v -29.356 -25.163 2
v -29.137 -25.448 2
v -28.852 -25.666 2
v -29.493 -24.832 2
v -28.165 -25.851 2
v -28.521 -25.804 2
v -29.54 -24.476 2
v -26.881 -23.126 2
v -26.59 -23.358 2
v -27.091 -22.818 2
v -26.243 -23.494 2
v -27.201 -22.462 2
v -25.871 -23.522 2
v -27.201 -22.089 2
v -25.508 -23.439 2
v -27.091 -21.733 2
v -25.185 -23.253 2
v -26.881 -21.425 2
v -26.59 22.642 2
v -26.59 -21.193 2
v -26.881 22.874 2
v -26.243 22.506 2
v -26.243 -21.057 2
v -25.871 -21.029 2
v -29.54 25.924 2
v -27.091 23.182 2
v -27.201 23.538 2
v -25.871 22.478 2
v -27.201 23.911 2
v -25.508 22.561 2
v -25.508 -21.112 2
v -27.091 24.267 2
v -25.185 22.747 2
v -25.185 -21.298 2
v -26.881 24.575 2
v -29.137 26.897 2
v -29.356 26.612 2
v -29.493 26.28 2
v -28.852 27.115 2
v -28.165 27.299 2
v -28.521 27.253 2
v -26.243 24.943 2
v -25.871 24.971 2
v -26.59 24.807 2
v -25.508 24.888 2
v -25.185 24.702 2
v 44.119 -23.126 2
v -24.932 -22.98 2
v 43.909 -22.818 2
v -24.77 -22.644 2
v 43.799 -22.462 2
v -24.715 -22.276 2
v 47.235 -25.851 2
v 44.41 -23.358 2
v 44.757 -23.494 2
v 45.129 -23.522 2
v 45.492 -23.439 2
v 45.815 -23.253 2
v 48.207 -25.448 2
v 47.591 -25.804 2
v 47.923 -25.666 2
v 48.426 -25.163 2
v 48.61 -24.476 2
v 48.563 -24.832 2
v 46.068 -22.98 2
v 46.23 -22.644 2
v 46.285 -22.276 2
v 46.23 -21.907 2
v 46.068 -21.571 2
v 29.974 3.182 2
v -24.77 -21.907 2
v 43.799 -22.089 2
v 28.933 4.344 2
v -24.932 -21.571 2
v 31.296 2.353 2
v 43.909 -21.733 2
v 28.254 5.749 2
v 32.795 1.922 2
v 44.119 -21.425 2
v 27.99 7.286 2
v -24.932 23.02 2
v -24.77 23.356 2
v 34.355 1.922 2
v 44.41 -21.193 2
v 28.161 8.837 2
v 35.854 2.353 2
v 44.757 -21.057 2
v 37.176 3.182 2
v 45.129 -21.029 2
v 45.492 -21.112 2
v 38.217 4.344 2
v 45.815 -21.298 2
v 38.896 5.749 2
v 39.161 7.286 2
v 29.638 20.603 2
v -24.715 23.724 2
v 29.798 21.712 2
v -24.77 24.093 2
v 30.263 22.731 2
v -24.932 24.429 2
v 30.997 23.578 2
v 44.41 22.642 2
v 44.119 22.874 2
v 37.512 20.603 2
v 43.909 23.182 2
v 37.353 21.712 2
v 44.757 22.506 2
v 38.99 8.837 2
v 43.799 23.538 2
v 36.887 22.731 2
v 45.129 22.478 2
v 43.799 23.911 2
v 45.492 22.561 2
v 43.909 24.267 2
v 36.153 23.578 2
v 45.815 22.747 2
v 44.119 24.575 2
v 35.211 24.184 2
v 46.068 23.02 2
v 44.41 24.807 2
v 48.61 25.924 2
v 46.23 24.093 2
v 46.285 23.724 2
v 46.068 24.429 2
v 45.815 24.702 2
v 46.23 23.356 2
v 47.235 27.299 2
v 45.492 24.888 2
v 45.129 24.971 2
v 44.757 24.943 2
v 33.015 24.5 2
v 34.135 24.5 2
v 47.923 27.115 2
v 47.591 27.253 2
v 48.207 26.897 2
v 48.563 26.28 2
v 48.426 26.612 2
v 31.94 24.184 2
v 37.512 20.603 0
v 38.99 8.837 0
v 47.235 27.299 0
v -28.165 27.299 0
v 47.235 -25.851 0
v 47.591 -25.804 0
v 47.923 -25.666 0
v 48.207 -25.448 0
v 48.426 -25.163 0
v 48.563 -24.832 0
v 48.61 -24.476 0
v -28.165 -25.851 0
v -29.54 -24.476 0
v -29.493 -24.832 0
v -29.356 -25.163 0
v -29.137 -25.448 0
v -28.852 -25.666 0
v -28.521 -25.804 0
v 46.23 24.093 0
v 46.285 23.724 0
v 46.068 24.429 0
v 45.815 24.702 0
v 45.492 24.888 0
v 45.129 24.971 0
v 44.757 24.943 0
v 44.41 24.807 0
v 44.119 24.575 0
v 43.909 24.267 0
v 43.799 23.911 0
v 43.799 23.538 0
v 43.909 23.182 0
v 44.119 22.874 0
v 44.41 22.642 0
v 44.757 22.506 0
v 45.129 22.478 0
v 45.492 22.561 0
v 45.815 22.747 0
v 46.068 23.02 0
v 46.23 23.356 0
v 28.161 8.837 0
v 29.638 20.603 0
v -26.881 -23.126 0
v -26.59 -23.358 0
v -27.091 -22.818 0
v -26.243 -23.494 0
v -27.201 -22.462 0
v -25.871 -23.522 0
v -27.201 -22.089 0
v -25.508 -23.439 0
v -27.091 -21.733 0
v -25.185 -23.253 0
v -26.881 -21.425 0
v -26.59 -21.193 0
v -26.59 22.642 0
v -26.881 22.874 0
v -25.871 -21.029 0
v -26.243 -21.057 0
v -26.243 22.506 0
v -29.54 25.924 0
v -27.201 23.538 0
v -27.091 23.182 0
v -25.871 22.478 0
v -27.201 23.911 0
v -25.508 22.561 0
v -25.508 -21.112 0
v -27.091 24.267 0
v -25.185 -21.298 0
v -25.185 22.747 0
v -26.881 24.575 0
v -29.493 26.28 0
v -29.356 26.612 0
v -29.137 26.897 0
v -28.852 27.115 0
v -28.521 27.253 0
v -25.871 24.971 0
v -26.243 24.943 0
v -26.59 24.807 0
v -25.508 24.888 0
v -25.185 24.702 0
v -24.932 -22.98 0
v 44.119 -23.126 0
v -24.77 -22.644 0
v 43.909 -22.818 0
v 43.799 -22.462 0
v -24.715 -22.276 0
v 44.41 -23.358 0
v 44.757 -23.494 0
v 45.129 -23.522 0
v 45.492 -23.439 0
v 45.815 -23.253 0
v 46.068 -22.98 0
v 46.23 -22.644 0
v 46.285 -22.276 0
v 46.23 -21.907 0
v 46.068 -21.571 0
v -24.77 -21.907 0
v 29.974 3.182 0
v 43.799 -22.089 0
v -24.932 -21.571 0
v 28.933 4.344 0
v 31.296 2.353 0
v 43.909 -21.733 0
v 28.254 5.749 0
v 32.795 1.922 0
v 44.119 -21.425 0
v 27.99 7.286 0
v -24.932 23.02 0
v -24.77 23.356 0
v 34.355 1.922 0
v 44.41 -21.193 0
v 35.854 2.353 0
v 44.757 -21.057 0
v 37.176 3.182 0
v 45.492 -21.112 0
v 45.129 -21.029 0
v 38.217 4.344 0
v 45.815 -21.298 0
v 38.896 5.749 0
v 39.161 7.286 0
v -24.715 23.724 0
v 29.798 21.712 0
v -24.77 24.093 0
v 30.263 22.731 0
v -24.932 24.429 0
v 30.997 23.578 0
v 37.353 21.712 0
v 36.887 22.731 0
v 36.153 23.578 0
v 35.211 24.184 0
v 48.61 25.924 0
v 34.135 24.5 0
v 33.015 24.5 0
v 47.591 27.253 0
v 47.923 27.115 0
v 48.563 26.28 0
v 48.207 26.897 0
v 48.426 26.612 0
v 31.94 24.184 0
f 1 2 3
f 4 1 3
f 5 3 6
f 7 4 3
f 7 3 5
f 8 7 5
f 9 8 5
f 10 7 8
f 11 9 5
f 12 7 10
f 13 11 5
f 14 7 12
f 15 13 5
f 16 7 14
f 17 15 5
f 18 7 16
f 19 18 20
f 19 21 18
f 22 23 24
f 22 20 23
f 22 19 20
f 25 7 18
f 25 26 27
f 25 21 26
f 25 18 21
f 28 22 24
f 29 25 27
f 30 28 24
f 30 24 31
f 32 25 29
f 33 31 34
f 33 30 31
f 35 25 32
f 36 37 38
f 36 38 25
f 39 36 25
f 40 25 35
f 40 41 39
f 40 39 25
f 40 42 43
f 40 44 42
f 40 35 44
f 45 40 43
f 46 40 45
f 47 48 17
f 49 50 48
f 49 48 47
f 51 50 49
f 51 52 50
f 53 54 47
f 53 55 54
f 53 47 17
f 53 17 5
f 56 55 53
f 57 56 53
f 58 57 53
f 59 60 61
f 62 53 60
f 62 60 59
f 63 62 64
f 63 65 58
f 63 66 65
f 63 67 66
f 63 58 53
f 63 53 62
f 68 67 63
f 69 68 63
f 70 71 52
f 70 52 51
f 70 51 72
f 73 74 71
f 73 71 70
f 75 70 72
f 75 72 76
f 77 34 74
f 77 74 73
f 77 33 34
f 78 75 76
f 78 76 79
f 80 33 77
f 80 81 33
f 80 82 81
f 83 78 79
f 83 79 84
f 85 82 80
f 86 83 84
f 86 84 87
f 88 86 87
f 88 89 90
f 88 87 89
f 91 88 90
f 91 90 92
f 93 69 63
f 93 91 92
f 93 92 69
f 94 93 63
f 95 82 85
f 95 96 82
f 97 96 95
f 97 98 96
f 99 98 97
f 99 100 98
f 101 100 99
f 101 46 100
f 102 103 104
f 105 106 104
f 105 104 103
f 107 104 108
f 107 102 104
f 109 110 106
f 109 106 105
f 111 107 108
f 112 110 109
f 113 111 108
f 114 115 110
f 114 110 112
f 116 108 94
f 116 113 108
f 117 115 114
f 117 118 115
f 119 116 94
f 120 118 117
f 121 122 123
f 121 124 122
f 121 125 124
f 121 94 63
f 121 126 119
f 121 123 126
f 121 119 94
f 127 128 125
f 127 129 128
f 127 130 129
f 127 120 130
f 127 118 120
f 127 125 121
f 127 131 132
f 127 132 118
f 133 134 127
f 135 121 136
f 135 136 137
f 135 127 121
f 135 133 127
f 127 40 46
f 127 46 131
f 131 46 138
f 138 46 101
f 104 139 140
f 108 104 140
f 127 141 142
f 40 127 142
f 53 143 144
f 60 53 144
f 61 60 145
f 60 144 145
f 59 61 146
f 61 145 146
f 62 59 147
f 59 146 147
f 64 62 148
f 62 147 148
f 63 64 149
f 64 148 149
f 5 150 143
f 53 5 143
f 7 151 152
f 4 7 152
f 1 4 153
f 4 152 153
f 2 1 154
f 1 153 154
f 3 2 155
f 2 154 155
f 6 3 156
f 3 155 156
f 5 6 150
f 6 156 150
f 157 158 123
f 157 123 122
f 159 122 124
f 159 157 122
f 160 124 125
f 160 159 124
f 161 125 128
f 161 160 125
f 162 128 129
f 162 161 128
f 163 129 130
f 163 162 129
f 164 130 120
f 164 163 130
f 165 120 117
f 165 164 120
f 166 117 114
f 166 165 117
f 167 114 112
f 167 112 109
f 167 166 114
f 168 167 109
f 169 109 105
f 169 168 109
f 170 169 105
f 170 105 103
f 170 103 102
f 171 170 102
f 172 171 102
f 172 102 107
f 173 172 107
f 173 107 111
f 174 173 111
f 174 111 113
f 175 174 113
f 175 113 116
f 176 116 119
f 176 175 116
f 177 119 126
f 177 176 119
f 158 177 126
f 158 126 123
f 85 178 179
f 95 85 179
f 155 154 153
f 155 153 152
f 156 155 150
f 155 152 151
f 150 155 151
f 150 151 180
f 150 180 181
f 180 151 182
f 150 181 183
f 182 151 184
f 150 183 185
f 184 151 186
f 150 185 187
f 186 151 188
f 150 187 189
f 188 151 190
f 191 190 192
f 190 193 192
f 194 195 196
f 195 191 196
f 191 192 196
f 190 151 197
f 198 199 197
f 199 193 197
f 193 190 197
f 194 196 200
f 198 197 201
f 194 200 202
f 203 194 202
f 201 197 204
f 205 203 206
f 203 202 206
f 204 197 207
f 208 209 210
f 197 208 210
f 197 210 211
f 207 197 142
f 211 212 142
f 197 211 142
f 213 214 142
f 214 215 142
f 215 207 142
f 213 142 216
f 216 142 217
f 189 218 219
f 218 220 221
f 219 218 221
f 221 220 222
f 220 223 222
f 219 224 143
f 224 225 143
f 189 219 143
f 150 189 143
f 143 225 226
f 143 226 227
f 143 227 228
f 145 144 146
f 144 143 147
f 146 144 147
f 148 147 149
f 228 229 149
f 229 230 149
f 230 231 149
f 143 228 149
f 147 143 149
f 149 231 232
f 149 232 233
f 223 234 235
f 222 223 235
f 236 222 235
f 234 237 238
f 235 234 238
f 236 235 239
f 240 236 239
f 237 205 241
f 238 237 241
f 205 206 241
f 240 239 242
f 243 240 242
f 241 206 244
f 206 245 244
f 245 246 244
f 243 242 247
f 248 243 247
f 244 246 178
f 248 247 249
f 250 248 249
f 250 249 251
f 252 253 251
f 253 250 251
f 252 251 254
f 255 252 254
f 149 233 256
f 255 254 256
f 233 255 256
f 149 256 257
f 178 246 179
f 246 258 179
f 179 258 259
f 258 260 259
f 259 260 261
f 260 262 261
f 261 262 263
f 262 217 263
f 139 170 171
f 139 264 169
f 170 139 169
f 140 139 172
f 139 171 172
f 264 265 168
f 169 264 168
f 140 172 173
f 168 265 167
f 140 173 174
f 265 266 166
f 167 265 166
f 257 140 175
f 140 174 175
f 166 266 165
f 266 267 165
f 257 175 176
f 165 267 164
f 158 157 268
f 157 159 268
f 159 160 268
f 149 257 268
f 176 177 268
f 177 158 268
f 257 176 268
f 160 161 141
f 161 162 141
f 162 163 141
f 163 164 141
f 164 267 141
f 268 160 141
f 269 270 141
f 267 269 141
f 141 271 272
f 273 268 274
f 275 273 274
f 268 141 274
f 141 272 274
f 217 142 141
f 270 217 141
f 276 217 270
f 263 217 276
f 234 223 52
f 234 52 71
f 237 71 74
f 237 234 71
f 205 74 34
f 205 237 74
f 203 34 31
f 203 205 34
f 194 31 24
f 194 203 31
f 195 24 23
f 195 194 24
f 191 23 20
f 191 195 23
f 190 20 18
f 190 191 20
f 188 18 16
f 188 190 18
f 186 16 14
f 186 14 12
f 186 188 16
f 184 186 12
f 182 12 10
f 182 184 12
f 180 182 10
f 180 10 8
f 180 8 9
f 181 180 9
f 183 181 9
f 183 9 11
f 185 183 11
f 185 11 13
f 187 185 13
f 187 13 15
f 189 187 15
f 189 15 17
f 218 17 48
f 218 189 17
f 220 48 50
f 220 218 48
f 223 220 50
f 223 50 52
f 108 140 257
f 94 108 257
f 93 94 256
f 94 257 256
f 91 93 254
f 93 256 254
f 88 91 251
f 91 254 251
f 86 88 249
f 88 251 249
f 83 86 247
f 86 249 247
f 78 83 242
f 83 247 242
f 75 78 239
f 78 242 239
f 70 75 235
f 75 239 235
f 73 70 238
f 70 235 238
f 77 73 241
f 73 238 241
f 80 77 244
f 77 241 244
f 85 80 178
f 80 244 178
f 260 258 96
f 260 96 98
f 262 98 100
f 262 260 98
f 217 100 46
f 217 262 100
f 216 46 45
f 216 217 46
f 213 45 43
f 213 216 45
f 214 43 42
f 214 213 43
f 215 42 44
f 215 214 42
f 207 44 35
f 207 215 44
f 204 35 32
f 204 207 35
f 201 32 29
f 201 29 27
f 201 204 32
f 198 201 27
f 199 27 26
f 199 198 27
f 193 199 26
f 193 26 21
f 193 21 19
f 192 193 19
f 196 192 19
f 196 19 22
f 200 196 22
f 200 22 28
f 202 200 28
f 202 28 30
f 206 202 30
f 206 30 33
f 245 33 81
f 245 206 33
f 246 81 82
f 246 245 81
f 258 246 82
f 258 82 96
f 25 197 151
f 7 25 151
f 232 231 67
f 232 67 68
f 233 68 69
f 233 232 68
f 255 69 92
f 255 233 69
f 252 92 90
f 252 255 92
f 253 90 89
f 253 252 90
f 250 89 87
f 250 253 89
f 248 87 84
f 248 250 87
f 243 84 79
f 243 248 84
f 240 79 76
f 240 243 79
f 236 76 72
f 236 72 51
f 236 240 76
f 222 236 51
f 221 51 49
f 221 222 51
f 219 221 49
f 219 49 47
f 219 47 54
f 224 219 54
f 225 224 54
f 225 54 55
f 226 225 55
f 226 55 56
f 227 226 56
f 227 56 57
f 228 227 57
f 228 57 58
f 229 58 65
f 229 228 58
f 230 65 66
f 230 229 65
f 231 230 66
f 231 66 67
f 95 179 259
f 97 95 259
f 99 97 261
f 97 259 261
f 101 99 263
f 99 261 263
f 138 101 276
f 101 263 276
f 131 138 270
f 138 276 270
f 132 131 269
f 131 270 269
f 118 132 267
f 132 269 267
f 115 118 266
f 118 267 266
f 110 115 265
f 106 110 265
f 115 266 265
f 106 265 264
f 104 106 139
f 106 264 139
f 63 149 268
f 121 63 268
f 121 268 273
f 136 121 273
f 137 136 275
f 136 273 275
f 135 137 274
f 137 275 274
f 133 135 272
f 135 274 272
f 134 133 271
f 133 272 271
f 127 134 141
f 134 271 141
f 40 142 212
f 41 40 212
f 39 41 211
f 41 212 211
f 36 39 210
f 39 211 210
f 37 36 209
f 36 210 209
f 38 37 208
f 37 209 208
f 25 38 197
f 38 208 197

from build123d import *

# Parameters (mm, degrees)
SKETCH1_R           = 1.25
BOSS_EXTRUDE1_DEPTH = 2


with BuildPart() as part:
    # Sketch1 → Boss-Extrude1 (new body)
    with BuildSketch(Plane.XY):
        with BuildLine():
            ThreePointArc((48.610141298, 25.924362859), (48.207413123, 26.896634683), (47.235141298, 27.299362859))
            Line((47.235141298, 27.299362859), (-28.164858702, 27.299362859))
            ThreePointArc((-28.164858702, 27.299362859), (-29.137130526, 26.896634683), (-29.539858702, 25.924362859))
            Line((-29.539858702, 25.924362859), (-29.539858702, -24.475637141))
            ThreePointArc((-29.539858702, -24.475637141), (-29.137130526, -25.447908965), (-28.164858702, -25.850637141))
            Line((-28.164858702, -25.850637141), (47.235141298, -25.850637141))
            ThreePointArc((47.235141298, -25.850637141), (48.207413123, -25.447908965), (48.610141298, -24.475637141))
            Line((48.610141298, -24.475637141), (48.610141298, 25.924362859))
        make_face()
        with Locations((-25.964858702, -22.275637141)):
            Circle(SKETCH1_R, mode=Mode.SUBTRACT)
        with Locations((45.035141298, -22.275637141)):
            Circle(SKETCH1_R, mode=Mode.SUBTRACT)
        with Locations((-25.964858702, 23.724362859)):
            Circle(SKETCH1_R, mode=Mode.SUBTRACT)
        with BuildLine():
            ThreePointArc((29.638141298, 20.602682845), (33.575141298, 24.539682845), (37.512141298, 20.602682845))
            Line((37.512141298, 20.602682845), (38.989636745, 8.837022391))
            ThreePointArc((38.989636745, 8.837022391), (33.575141298, 1.867362859), (28.160645852, 8.837022391))
            Line((28.160645852, 8.837022391), (29.638141298, 20.602682845))
        make_face(mode=Mode.SUBTRACT)
        with Locations((45.035141298, 23.724362859)):
            Circle(SKETCH1_R, mode=Mode.SUBTRACT)
    extrude(amount=BOSS_EXTRUDE1_DEPTH)


solid = part.part
